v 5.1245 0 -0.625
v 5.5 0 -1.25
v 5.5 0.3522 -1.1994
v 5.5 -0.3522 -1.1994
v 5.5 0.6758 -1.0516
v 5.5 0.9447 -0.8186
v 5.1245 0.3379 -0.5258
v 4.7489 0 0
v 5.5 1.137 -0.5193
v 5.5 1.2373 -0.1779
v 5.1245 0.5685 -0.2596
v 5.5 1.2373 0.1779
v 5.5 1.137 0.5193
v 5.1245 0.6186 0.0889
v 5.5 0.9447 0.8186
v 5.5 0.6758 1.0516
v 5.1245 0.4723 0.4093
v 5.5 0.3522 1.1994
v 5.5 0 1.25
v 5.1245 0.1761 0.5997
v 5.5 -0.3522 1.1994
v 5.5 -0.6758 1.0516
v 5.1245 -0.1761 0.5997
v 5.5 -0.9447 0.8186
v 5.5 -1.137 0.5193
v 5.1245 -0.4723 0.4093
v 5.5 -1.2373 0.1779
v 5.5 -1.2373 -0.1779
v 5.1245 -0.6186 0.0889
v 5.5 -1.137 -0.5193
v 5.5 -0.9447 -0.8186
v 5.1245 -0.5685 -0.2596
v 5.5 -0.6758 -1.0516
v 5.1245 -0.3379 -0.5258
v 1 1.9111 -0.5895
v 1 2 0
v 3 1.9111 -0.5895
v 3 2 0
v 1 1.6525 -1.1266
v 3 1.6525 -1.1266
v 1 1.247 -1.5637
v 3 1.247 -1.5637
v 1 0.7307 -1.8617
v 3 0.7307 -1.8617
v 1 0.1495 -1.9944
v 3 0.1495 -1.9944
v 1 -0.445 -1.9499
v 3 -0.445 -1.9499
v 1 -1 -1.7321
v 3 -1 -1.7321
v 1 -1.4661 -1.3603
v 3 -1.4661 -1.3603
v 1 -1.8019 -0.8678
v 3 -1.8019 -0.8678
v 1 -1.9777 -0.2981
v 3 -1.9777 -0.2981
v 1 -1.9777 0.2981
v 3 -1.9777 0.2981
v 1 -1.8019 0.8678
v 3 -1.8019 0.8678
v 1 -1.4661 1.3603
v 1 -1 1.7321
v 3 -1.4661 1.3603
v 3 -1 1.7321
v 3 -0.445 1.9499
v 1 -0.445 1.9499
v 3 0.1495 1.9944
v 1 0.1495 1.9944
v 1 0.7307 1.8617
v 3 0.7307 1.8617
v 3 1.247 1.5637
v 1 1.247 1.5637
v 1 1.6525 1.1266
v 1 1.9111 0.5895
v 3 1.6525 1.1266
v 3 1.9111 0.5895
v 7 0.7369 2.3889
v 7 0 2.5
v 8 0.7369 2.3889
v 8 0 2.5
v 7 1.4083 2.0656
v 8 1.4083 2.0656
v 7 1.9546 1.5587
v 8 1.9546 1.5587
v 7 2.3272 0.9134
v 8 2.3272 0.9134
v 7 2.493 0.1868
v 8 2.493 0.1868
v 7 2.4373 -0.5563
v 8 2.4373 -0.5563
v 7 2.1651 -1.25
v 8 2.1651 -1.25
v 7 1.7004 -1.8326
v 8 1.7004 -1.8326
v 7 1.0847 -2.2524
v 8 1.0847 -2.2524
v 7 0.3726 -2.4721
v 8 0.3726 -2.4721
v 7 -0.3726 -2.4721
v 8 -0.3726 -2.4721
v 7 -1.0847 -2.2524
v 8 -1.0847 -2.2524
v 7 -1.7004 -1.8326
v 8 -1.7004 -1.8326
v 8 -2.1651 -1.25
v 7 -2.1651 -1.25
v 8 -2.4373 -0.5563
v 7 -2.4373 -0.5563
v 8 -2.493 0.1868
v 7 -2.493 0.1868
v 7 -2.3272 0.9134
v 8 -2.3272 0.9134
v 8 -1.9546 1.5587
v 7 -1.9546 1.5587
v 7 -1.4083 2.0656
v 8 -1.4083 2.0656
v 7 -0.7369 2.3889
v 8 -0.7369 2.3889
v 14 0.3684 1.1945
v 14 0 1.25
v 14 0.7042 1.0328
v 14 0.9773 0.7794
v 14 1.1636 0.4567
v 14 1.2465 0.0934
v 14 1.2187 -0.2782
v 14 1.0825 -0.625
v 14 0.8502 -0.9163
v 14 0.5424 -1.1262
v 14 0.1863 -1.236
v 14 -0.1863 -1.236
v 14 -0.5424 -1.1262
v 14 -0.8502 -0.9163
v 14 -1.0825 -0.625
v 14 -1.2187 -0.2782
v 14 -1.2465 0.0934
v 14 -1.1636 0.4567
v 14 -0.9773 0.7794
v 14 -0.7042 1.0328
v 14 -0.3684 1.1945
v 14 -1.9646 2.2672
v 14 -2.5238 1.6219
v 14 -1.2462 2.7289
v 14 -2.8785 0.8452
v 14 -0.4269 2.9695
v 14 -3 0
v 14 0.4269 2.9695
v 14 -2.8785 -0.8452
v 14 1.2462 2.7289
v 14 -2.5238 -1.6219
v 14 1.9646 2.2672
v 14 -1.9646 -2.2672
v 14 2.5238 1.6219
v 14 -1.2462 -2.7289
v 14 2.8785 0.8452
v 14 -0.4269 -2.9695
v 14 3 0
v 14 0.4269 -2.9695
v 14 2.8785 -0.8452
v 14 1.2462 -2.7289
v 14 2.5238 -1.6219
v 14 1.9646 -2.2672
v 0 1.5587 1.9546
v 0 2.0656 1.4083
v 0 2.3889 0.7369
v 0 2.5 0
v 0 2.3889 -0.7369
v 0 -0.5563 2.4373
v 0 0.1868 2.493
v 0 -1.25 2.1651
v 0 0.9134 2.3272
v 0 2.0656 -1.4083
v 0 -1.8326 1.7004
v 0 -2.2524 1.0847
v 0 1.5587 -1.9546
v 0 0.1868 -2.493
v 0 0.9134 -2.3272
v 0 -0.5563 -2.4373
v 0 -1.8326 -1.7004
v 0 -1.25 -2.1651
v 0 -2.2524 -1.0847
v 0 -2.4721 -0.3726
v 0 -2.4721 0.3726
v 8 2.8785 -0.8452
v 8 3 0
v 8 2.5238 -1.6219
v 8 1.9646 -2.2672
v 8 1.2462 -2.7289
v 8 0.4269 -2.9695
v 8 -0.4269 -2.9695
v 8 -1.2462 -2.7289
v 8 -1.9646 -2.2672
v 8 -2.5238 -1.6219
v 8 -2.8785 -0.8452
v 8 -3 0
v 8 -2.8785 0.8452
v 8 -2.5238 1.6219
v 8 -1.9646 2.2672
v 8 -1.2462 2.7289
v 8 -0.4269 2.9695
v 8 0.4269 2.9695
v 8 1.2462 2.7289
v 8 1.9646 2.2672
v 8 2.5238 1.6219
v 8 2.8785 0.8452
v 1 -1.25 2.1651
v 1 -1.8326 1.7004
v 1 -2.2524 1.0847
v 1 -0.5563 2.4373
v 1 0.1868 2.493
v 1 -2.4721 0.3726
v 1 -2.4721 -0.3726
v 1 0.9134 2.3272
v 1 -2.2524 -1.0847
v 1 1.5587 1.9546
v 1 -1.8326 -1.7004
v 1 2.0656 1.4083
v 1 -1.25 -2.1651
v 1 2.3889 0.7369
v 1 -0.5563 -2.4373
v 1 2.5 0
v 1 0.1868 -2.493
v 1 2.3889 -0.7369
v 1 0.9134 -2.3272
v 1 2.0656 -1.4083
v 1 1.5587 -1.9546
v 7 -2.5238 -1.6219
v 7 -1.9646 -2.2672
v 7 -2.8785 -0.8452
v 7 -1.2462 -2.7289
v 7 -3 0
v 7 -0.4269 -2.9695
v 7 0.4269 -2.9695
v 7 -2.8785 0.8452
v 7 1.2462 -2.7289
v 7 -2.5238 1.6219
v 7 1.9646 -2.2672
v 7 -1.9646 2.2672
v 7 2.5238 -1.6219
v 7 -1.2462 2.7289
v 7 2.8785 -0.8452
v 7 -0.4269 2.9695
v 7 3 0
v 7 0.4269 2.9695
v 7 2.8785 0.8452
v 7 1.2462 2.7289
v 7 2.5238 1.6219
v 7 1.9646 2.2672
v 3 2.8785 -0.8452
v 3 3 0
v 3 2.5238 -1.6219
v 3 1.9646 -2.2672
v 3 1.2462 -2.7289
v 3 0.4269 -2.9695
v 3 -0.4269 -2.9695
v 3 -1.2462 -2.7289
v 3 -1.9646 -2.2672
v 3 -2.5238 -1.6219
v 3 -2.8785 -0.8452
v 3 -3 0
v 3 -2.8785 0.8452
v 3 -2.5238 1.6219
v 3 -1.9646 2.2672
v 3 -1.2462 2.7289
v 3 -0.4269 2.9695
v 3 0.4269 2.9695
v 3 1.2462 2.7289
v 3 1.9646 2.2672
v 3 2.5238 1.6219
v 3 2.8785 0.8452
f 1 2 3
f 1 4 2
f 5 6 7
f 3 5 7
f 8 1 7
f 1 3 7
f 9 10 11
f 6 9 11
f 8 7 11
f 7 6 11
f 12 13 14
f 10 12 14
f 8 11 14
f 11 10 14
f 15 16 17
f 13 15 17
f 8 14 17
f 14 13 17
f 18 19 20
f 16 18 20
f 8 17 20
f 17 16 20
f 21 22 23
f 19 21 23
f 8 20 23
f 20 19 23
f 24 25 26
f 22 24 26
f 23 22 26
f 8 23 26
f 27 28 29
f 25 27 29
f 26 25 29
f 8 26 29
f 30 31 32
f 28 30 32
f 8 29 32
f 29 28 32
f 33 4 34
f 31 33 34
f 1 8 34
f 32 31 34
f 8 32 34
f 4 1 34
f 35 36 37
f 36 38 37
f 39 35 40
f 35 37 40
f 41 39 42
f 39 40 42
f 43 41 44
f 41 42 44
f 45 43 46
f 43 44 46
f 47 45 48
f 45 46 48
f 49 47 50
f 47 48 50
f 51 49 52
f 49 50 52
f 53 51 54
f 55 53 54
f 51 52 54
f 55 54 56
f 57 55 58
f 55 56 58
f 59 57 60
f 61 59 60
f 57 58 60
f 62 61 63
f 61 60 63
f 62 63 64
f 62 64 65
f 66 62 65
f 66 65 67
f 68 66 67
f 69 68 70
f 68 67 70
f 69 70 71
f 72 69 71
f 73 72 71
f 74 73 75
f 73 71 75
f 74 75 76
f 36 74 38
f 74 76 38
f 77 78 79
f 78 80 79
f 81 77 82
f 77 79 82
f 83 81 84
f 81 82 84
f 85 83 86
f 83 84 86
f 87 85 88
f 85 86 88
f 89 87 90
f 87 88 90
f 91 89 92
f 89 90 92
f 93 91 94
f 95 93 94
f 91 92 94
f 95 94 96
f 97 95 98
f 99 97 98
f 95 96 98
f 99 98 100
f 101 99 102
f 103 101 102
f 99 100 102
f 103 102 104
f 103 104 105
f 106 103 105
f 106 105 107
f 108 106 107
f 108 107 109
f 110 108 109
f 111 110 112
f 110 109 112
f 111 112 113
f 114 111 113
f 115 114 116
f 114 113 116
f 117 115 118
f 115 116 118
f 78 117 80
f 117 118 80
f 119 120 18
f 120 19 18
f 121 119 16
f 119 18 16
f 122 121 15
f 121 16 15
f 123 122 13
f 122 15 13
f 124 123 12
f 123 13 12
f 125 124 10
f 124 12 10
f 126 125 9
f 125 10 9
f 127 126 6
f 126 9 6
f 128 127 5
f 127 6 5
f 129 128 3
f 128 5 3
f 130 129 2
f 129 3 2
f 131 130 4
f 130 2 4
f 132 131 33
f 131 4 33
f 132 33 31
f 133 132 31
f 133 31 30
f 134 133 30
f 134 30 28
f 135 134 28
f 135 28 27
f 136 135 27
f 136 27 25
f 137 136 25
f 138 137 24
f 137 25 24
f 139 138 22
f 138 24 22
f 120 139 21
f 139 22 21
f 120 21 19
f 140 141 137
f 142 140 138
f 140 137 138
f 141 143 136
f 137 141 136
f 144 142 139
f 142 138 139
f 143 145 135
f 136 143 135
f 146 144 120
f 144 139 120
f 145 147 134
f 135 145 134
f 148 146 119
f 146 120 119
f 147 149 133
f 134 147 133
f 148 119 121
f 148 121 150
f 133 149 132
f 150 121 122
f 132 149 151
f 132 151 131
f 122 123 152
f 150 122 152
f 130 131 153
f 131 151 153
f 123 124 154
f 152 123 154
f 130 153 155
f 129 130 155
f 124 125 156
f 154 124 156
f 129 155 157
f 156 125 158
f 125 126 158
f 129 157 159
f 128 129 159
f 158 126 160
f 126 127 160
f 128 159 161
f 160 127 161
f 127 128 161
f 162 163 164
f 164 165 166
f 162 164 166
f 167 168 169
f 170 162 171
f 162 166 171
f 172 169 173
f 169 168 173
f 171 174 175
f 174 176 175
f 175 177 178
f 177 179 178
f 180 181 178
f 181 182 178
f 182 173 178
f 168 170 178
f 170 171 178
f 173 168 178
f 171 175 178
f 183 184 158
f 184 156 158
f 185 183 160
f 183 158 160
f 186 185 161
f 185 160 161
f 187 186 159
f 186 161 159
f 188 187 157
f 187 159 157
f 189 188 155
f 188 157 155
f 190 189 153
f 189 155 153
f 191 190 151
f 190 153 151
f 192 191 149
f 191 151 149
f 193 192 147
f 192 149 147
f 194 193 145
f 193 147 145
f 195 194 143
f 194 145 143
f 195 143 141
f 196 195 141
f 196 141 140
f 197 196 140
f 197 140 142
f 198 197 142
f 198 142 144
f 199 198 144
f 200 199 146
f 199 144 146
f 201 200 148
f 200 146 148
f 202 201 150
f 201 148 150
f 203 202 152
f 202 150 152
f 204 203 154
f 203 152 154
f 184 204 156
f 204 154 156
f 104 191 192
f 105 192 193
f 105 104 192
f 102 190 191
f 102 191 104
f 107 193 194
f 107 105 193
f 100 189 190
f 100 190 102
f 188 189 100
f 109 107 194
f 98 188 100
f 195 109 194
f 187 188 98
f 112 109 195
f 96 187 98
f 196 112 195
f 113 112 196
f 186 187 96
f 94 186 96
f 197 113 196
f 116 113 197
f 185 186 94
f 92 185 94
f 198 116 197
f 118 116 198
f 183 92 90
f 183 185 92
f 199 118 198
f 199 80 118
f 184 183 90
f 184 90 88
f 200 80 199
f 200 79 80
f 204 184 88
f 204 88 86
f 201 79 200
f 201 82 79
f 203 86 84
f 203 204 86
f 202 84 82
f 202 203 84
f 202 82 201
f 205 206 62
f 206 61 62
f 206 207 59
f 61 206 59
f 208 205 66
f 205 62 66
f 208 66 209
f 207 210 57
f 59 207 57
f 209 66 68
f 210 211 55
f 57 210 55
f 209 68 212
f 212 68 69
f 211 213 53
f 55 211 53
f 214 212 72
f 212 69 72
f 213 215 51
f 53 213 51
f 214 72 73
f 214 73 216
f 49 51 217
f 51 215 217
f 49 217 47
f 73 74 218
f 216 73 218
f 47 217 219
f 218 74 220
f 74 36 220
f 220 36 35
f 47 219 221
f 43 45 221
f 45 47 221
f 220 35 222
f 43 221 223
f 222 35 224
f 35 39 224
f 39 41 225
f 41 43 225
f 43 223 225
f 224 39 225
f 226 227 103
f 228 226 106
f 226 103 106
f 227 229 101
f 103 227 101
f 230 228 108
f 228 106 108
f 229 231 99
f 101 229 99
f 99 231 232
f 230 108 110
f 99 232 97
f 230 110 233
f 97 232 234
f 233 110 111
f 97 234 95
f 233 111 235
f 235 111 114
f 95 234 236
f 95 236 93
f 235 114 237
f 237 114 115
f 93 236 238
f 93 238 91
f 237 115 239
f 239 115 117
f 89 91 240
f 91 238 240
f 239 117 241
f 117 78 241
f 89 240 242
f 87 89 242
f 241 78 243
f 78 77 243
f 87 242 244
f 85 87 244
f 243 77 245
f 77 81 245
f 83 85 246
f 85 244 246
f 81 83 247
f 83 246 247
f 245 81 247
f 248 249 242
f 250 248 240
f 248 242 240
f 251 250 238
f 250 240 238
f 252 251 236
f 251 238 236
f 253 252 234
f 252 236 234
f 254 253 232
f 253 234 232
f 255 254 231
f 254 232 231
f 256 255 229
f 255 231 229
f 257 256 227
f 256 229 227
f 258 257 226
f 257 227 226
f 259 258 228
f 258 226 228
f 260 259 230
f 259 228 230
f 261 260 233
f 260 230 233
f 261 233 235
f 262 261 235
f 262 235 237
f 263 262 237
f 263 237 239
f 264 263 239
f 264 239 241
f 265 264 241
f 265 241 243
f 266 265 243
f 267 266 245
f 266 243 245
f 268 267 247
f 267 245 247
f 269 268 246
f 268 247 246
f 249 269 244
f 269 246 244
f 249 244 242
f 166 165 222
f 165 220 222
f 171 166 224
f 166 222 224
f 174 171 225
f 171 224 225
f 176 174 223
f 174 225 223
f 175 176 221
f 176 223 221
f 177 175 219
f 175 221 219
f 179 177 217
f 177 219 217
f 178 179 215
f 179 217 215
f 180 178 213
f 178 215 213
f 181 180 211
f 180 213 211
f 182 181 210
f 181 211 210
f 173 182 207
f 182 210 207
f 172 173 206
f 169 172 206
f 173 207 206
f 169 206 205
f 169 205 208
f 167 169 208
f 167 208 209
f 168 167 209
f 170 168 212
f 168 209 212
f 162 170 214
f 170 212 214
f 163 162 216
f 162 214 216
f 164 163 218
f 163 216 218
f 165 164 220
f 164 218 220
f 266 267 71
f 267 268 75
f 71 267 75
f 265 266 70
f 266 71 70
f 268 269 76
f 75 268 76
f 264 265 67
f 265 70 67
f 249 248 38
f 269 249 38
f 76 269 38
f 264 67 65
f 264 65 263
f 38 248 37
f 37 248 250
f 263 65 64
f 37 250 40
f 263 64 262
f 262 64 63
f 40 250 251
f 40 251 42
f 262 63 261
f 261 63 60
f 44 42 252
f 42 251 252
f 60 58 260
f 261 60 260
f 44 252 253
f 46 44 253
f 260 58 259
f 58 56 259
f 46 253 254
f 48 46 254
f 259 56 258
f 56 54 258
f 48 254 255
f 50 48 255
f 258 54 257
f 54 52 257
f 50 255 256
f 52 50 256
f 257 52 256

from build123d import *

# Parameters (mm, degrees)
TROU_TARAUD_M31_D       = 2.5
TROU_TARAUD_M31_DEPTH   = 8.5
TROU_TARAUD_M31_TIP     = 0.751075774
ESQUISSE4_R             = 3
ESQUISSE4_R_2           = 2.5
ENL_V_MAT_EXTRU_1_DEPTH = 0.5


with BuildPart() as part:
    # Esquisse1 → Révolution1 (revolve)
    with BuildSketch(Plane.XY):
        Polygon((0, 0), (0, 2.5), (1, 2.5), (1, 2), (3, 2), (3, 3), (14, 3), (14, 0), align=None)
    revolve(axis=Axis((14, 0, 0), (-1, 0, 0)))

    # Trou taraudé M31
    with Locations(Plane(origin=(14, 0, 0), x_dir=(0, 0, -1), z_dir=(1, 0, 0))):
        with Locations((0, 0)):
            Hole(TROU_TARAUD_M31_D / 2, depth=TROU_TARAUD_M31_DEPTH)
            with Locations((0, 0, -(TROU_TARAUD_M31_DEPTH + TROU_TARAUD_M31_TIP / 2))):  # 118° drill point
                Cone(0, TROU_TARAUD_M31_D / 2, TROU_TARAUD_M31_TIP, mode=Mode.SUBTRACT)

    # Esquisse4 → Enlèv. mat.-Extru.1 (cut, symmetric)
    with BuildSketch(Plane.ZY.offset(-7.5)):
        Circle(ESQUISSE4_R)
        Circle(ESQUISSE4_R_2, mode=Mode.SUBTRACT)
    extrude(amount=ENL_V_MAT_EXTRU_1_DEPTH, both=True, mode=Mode.SUBTRACT)


solid = part.part
